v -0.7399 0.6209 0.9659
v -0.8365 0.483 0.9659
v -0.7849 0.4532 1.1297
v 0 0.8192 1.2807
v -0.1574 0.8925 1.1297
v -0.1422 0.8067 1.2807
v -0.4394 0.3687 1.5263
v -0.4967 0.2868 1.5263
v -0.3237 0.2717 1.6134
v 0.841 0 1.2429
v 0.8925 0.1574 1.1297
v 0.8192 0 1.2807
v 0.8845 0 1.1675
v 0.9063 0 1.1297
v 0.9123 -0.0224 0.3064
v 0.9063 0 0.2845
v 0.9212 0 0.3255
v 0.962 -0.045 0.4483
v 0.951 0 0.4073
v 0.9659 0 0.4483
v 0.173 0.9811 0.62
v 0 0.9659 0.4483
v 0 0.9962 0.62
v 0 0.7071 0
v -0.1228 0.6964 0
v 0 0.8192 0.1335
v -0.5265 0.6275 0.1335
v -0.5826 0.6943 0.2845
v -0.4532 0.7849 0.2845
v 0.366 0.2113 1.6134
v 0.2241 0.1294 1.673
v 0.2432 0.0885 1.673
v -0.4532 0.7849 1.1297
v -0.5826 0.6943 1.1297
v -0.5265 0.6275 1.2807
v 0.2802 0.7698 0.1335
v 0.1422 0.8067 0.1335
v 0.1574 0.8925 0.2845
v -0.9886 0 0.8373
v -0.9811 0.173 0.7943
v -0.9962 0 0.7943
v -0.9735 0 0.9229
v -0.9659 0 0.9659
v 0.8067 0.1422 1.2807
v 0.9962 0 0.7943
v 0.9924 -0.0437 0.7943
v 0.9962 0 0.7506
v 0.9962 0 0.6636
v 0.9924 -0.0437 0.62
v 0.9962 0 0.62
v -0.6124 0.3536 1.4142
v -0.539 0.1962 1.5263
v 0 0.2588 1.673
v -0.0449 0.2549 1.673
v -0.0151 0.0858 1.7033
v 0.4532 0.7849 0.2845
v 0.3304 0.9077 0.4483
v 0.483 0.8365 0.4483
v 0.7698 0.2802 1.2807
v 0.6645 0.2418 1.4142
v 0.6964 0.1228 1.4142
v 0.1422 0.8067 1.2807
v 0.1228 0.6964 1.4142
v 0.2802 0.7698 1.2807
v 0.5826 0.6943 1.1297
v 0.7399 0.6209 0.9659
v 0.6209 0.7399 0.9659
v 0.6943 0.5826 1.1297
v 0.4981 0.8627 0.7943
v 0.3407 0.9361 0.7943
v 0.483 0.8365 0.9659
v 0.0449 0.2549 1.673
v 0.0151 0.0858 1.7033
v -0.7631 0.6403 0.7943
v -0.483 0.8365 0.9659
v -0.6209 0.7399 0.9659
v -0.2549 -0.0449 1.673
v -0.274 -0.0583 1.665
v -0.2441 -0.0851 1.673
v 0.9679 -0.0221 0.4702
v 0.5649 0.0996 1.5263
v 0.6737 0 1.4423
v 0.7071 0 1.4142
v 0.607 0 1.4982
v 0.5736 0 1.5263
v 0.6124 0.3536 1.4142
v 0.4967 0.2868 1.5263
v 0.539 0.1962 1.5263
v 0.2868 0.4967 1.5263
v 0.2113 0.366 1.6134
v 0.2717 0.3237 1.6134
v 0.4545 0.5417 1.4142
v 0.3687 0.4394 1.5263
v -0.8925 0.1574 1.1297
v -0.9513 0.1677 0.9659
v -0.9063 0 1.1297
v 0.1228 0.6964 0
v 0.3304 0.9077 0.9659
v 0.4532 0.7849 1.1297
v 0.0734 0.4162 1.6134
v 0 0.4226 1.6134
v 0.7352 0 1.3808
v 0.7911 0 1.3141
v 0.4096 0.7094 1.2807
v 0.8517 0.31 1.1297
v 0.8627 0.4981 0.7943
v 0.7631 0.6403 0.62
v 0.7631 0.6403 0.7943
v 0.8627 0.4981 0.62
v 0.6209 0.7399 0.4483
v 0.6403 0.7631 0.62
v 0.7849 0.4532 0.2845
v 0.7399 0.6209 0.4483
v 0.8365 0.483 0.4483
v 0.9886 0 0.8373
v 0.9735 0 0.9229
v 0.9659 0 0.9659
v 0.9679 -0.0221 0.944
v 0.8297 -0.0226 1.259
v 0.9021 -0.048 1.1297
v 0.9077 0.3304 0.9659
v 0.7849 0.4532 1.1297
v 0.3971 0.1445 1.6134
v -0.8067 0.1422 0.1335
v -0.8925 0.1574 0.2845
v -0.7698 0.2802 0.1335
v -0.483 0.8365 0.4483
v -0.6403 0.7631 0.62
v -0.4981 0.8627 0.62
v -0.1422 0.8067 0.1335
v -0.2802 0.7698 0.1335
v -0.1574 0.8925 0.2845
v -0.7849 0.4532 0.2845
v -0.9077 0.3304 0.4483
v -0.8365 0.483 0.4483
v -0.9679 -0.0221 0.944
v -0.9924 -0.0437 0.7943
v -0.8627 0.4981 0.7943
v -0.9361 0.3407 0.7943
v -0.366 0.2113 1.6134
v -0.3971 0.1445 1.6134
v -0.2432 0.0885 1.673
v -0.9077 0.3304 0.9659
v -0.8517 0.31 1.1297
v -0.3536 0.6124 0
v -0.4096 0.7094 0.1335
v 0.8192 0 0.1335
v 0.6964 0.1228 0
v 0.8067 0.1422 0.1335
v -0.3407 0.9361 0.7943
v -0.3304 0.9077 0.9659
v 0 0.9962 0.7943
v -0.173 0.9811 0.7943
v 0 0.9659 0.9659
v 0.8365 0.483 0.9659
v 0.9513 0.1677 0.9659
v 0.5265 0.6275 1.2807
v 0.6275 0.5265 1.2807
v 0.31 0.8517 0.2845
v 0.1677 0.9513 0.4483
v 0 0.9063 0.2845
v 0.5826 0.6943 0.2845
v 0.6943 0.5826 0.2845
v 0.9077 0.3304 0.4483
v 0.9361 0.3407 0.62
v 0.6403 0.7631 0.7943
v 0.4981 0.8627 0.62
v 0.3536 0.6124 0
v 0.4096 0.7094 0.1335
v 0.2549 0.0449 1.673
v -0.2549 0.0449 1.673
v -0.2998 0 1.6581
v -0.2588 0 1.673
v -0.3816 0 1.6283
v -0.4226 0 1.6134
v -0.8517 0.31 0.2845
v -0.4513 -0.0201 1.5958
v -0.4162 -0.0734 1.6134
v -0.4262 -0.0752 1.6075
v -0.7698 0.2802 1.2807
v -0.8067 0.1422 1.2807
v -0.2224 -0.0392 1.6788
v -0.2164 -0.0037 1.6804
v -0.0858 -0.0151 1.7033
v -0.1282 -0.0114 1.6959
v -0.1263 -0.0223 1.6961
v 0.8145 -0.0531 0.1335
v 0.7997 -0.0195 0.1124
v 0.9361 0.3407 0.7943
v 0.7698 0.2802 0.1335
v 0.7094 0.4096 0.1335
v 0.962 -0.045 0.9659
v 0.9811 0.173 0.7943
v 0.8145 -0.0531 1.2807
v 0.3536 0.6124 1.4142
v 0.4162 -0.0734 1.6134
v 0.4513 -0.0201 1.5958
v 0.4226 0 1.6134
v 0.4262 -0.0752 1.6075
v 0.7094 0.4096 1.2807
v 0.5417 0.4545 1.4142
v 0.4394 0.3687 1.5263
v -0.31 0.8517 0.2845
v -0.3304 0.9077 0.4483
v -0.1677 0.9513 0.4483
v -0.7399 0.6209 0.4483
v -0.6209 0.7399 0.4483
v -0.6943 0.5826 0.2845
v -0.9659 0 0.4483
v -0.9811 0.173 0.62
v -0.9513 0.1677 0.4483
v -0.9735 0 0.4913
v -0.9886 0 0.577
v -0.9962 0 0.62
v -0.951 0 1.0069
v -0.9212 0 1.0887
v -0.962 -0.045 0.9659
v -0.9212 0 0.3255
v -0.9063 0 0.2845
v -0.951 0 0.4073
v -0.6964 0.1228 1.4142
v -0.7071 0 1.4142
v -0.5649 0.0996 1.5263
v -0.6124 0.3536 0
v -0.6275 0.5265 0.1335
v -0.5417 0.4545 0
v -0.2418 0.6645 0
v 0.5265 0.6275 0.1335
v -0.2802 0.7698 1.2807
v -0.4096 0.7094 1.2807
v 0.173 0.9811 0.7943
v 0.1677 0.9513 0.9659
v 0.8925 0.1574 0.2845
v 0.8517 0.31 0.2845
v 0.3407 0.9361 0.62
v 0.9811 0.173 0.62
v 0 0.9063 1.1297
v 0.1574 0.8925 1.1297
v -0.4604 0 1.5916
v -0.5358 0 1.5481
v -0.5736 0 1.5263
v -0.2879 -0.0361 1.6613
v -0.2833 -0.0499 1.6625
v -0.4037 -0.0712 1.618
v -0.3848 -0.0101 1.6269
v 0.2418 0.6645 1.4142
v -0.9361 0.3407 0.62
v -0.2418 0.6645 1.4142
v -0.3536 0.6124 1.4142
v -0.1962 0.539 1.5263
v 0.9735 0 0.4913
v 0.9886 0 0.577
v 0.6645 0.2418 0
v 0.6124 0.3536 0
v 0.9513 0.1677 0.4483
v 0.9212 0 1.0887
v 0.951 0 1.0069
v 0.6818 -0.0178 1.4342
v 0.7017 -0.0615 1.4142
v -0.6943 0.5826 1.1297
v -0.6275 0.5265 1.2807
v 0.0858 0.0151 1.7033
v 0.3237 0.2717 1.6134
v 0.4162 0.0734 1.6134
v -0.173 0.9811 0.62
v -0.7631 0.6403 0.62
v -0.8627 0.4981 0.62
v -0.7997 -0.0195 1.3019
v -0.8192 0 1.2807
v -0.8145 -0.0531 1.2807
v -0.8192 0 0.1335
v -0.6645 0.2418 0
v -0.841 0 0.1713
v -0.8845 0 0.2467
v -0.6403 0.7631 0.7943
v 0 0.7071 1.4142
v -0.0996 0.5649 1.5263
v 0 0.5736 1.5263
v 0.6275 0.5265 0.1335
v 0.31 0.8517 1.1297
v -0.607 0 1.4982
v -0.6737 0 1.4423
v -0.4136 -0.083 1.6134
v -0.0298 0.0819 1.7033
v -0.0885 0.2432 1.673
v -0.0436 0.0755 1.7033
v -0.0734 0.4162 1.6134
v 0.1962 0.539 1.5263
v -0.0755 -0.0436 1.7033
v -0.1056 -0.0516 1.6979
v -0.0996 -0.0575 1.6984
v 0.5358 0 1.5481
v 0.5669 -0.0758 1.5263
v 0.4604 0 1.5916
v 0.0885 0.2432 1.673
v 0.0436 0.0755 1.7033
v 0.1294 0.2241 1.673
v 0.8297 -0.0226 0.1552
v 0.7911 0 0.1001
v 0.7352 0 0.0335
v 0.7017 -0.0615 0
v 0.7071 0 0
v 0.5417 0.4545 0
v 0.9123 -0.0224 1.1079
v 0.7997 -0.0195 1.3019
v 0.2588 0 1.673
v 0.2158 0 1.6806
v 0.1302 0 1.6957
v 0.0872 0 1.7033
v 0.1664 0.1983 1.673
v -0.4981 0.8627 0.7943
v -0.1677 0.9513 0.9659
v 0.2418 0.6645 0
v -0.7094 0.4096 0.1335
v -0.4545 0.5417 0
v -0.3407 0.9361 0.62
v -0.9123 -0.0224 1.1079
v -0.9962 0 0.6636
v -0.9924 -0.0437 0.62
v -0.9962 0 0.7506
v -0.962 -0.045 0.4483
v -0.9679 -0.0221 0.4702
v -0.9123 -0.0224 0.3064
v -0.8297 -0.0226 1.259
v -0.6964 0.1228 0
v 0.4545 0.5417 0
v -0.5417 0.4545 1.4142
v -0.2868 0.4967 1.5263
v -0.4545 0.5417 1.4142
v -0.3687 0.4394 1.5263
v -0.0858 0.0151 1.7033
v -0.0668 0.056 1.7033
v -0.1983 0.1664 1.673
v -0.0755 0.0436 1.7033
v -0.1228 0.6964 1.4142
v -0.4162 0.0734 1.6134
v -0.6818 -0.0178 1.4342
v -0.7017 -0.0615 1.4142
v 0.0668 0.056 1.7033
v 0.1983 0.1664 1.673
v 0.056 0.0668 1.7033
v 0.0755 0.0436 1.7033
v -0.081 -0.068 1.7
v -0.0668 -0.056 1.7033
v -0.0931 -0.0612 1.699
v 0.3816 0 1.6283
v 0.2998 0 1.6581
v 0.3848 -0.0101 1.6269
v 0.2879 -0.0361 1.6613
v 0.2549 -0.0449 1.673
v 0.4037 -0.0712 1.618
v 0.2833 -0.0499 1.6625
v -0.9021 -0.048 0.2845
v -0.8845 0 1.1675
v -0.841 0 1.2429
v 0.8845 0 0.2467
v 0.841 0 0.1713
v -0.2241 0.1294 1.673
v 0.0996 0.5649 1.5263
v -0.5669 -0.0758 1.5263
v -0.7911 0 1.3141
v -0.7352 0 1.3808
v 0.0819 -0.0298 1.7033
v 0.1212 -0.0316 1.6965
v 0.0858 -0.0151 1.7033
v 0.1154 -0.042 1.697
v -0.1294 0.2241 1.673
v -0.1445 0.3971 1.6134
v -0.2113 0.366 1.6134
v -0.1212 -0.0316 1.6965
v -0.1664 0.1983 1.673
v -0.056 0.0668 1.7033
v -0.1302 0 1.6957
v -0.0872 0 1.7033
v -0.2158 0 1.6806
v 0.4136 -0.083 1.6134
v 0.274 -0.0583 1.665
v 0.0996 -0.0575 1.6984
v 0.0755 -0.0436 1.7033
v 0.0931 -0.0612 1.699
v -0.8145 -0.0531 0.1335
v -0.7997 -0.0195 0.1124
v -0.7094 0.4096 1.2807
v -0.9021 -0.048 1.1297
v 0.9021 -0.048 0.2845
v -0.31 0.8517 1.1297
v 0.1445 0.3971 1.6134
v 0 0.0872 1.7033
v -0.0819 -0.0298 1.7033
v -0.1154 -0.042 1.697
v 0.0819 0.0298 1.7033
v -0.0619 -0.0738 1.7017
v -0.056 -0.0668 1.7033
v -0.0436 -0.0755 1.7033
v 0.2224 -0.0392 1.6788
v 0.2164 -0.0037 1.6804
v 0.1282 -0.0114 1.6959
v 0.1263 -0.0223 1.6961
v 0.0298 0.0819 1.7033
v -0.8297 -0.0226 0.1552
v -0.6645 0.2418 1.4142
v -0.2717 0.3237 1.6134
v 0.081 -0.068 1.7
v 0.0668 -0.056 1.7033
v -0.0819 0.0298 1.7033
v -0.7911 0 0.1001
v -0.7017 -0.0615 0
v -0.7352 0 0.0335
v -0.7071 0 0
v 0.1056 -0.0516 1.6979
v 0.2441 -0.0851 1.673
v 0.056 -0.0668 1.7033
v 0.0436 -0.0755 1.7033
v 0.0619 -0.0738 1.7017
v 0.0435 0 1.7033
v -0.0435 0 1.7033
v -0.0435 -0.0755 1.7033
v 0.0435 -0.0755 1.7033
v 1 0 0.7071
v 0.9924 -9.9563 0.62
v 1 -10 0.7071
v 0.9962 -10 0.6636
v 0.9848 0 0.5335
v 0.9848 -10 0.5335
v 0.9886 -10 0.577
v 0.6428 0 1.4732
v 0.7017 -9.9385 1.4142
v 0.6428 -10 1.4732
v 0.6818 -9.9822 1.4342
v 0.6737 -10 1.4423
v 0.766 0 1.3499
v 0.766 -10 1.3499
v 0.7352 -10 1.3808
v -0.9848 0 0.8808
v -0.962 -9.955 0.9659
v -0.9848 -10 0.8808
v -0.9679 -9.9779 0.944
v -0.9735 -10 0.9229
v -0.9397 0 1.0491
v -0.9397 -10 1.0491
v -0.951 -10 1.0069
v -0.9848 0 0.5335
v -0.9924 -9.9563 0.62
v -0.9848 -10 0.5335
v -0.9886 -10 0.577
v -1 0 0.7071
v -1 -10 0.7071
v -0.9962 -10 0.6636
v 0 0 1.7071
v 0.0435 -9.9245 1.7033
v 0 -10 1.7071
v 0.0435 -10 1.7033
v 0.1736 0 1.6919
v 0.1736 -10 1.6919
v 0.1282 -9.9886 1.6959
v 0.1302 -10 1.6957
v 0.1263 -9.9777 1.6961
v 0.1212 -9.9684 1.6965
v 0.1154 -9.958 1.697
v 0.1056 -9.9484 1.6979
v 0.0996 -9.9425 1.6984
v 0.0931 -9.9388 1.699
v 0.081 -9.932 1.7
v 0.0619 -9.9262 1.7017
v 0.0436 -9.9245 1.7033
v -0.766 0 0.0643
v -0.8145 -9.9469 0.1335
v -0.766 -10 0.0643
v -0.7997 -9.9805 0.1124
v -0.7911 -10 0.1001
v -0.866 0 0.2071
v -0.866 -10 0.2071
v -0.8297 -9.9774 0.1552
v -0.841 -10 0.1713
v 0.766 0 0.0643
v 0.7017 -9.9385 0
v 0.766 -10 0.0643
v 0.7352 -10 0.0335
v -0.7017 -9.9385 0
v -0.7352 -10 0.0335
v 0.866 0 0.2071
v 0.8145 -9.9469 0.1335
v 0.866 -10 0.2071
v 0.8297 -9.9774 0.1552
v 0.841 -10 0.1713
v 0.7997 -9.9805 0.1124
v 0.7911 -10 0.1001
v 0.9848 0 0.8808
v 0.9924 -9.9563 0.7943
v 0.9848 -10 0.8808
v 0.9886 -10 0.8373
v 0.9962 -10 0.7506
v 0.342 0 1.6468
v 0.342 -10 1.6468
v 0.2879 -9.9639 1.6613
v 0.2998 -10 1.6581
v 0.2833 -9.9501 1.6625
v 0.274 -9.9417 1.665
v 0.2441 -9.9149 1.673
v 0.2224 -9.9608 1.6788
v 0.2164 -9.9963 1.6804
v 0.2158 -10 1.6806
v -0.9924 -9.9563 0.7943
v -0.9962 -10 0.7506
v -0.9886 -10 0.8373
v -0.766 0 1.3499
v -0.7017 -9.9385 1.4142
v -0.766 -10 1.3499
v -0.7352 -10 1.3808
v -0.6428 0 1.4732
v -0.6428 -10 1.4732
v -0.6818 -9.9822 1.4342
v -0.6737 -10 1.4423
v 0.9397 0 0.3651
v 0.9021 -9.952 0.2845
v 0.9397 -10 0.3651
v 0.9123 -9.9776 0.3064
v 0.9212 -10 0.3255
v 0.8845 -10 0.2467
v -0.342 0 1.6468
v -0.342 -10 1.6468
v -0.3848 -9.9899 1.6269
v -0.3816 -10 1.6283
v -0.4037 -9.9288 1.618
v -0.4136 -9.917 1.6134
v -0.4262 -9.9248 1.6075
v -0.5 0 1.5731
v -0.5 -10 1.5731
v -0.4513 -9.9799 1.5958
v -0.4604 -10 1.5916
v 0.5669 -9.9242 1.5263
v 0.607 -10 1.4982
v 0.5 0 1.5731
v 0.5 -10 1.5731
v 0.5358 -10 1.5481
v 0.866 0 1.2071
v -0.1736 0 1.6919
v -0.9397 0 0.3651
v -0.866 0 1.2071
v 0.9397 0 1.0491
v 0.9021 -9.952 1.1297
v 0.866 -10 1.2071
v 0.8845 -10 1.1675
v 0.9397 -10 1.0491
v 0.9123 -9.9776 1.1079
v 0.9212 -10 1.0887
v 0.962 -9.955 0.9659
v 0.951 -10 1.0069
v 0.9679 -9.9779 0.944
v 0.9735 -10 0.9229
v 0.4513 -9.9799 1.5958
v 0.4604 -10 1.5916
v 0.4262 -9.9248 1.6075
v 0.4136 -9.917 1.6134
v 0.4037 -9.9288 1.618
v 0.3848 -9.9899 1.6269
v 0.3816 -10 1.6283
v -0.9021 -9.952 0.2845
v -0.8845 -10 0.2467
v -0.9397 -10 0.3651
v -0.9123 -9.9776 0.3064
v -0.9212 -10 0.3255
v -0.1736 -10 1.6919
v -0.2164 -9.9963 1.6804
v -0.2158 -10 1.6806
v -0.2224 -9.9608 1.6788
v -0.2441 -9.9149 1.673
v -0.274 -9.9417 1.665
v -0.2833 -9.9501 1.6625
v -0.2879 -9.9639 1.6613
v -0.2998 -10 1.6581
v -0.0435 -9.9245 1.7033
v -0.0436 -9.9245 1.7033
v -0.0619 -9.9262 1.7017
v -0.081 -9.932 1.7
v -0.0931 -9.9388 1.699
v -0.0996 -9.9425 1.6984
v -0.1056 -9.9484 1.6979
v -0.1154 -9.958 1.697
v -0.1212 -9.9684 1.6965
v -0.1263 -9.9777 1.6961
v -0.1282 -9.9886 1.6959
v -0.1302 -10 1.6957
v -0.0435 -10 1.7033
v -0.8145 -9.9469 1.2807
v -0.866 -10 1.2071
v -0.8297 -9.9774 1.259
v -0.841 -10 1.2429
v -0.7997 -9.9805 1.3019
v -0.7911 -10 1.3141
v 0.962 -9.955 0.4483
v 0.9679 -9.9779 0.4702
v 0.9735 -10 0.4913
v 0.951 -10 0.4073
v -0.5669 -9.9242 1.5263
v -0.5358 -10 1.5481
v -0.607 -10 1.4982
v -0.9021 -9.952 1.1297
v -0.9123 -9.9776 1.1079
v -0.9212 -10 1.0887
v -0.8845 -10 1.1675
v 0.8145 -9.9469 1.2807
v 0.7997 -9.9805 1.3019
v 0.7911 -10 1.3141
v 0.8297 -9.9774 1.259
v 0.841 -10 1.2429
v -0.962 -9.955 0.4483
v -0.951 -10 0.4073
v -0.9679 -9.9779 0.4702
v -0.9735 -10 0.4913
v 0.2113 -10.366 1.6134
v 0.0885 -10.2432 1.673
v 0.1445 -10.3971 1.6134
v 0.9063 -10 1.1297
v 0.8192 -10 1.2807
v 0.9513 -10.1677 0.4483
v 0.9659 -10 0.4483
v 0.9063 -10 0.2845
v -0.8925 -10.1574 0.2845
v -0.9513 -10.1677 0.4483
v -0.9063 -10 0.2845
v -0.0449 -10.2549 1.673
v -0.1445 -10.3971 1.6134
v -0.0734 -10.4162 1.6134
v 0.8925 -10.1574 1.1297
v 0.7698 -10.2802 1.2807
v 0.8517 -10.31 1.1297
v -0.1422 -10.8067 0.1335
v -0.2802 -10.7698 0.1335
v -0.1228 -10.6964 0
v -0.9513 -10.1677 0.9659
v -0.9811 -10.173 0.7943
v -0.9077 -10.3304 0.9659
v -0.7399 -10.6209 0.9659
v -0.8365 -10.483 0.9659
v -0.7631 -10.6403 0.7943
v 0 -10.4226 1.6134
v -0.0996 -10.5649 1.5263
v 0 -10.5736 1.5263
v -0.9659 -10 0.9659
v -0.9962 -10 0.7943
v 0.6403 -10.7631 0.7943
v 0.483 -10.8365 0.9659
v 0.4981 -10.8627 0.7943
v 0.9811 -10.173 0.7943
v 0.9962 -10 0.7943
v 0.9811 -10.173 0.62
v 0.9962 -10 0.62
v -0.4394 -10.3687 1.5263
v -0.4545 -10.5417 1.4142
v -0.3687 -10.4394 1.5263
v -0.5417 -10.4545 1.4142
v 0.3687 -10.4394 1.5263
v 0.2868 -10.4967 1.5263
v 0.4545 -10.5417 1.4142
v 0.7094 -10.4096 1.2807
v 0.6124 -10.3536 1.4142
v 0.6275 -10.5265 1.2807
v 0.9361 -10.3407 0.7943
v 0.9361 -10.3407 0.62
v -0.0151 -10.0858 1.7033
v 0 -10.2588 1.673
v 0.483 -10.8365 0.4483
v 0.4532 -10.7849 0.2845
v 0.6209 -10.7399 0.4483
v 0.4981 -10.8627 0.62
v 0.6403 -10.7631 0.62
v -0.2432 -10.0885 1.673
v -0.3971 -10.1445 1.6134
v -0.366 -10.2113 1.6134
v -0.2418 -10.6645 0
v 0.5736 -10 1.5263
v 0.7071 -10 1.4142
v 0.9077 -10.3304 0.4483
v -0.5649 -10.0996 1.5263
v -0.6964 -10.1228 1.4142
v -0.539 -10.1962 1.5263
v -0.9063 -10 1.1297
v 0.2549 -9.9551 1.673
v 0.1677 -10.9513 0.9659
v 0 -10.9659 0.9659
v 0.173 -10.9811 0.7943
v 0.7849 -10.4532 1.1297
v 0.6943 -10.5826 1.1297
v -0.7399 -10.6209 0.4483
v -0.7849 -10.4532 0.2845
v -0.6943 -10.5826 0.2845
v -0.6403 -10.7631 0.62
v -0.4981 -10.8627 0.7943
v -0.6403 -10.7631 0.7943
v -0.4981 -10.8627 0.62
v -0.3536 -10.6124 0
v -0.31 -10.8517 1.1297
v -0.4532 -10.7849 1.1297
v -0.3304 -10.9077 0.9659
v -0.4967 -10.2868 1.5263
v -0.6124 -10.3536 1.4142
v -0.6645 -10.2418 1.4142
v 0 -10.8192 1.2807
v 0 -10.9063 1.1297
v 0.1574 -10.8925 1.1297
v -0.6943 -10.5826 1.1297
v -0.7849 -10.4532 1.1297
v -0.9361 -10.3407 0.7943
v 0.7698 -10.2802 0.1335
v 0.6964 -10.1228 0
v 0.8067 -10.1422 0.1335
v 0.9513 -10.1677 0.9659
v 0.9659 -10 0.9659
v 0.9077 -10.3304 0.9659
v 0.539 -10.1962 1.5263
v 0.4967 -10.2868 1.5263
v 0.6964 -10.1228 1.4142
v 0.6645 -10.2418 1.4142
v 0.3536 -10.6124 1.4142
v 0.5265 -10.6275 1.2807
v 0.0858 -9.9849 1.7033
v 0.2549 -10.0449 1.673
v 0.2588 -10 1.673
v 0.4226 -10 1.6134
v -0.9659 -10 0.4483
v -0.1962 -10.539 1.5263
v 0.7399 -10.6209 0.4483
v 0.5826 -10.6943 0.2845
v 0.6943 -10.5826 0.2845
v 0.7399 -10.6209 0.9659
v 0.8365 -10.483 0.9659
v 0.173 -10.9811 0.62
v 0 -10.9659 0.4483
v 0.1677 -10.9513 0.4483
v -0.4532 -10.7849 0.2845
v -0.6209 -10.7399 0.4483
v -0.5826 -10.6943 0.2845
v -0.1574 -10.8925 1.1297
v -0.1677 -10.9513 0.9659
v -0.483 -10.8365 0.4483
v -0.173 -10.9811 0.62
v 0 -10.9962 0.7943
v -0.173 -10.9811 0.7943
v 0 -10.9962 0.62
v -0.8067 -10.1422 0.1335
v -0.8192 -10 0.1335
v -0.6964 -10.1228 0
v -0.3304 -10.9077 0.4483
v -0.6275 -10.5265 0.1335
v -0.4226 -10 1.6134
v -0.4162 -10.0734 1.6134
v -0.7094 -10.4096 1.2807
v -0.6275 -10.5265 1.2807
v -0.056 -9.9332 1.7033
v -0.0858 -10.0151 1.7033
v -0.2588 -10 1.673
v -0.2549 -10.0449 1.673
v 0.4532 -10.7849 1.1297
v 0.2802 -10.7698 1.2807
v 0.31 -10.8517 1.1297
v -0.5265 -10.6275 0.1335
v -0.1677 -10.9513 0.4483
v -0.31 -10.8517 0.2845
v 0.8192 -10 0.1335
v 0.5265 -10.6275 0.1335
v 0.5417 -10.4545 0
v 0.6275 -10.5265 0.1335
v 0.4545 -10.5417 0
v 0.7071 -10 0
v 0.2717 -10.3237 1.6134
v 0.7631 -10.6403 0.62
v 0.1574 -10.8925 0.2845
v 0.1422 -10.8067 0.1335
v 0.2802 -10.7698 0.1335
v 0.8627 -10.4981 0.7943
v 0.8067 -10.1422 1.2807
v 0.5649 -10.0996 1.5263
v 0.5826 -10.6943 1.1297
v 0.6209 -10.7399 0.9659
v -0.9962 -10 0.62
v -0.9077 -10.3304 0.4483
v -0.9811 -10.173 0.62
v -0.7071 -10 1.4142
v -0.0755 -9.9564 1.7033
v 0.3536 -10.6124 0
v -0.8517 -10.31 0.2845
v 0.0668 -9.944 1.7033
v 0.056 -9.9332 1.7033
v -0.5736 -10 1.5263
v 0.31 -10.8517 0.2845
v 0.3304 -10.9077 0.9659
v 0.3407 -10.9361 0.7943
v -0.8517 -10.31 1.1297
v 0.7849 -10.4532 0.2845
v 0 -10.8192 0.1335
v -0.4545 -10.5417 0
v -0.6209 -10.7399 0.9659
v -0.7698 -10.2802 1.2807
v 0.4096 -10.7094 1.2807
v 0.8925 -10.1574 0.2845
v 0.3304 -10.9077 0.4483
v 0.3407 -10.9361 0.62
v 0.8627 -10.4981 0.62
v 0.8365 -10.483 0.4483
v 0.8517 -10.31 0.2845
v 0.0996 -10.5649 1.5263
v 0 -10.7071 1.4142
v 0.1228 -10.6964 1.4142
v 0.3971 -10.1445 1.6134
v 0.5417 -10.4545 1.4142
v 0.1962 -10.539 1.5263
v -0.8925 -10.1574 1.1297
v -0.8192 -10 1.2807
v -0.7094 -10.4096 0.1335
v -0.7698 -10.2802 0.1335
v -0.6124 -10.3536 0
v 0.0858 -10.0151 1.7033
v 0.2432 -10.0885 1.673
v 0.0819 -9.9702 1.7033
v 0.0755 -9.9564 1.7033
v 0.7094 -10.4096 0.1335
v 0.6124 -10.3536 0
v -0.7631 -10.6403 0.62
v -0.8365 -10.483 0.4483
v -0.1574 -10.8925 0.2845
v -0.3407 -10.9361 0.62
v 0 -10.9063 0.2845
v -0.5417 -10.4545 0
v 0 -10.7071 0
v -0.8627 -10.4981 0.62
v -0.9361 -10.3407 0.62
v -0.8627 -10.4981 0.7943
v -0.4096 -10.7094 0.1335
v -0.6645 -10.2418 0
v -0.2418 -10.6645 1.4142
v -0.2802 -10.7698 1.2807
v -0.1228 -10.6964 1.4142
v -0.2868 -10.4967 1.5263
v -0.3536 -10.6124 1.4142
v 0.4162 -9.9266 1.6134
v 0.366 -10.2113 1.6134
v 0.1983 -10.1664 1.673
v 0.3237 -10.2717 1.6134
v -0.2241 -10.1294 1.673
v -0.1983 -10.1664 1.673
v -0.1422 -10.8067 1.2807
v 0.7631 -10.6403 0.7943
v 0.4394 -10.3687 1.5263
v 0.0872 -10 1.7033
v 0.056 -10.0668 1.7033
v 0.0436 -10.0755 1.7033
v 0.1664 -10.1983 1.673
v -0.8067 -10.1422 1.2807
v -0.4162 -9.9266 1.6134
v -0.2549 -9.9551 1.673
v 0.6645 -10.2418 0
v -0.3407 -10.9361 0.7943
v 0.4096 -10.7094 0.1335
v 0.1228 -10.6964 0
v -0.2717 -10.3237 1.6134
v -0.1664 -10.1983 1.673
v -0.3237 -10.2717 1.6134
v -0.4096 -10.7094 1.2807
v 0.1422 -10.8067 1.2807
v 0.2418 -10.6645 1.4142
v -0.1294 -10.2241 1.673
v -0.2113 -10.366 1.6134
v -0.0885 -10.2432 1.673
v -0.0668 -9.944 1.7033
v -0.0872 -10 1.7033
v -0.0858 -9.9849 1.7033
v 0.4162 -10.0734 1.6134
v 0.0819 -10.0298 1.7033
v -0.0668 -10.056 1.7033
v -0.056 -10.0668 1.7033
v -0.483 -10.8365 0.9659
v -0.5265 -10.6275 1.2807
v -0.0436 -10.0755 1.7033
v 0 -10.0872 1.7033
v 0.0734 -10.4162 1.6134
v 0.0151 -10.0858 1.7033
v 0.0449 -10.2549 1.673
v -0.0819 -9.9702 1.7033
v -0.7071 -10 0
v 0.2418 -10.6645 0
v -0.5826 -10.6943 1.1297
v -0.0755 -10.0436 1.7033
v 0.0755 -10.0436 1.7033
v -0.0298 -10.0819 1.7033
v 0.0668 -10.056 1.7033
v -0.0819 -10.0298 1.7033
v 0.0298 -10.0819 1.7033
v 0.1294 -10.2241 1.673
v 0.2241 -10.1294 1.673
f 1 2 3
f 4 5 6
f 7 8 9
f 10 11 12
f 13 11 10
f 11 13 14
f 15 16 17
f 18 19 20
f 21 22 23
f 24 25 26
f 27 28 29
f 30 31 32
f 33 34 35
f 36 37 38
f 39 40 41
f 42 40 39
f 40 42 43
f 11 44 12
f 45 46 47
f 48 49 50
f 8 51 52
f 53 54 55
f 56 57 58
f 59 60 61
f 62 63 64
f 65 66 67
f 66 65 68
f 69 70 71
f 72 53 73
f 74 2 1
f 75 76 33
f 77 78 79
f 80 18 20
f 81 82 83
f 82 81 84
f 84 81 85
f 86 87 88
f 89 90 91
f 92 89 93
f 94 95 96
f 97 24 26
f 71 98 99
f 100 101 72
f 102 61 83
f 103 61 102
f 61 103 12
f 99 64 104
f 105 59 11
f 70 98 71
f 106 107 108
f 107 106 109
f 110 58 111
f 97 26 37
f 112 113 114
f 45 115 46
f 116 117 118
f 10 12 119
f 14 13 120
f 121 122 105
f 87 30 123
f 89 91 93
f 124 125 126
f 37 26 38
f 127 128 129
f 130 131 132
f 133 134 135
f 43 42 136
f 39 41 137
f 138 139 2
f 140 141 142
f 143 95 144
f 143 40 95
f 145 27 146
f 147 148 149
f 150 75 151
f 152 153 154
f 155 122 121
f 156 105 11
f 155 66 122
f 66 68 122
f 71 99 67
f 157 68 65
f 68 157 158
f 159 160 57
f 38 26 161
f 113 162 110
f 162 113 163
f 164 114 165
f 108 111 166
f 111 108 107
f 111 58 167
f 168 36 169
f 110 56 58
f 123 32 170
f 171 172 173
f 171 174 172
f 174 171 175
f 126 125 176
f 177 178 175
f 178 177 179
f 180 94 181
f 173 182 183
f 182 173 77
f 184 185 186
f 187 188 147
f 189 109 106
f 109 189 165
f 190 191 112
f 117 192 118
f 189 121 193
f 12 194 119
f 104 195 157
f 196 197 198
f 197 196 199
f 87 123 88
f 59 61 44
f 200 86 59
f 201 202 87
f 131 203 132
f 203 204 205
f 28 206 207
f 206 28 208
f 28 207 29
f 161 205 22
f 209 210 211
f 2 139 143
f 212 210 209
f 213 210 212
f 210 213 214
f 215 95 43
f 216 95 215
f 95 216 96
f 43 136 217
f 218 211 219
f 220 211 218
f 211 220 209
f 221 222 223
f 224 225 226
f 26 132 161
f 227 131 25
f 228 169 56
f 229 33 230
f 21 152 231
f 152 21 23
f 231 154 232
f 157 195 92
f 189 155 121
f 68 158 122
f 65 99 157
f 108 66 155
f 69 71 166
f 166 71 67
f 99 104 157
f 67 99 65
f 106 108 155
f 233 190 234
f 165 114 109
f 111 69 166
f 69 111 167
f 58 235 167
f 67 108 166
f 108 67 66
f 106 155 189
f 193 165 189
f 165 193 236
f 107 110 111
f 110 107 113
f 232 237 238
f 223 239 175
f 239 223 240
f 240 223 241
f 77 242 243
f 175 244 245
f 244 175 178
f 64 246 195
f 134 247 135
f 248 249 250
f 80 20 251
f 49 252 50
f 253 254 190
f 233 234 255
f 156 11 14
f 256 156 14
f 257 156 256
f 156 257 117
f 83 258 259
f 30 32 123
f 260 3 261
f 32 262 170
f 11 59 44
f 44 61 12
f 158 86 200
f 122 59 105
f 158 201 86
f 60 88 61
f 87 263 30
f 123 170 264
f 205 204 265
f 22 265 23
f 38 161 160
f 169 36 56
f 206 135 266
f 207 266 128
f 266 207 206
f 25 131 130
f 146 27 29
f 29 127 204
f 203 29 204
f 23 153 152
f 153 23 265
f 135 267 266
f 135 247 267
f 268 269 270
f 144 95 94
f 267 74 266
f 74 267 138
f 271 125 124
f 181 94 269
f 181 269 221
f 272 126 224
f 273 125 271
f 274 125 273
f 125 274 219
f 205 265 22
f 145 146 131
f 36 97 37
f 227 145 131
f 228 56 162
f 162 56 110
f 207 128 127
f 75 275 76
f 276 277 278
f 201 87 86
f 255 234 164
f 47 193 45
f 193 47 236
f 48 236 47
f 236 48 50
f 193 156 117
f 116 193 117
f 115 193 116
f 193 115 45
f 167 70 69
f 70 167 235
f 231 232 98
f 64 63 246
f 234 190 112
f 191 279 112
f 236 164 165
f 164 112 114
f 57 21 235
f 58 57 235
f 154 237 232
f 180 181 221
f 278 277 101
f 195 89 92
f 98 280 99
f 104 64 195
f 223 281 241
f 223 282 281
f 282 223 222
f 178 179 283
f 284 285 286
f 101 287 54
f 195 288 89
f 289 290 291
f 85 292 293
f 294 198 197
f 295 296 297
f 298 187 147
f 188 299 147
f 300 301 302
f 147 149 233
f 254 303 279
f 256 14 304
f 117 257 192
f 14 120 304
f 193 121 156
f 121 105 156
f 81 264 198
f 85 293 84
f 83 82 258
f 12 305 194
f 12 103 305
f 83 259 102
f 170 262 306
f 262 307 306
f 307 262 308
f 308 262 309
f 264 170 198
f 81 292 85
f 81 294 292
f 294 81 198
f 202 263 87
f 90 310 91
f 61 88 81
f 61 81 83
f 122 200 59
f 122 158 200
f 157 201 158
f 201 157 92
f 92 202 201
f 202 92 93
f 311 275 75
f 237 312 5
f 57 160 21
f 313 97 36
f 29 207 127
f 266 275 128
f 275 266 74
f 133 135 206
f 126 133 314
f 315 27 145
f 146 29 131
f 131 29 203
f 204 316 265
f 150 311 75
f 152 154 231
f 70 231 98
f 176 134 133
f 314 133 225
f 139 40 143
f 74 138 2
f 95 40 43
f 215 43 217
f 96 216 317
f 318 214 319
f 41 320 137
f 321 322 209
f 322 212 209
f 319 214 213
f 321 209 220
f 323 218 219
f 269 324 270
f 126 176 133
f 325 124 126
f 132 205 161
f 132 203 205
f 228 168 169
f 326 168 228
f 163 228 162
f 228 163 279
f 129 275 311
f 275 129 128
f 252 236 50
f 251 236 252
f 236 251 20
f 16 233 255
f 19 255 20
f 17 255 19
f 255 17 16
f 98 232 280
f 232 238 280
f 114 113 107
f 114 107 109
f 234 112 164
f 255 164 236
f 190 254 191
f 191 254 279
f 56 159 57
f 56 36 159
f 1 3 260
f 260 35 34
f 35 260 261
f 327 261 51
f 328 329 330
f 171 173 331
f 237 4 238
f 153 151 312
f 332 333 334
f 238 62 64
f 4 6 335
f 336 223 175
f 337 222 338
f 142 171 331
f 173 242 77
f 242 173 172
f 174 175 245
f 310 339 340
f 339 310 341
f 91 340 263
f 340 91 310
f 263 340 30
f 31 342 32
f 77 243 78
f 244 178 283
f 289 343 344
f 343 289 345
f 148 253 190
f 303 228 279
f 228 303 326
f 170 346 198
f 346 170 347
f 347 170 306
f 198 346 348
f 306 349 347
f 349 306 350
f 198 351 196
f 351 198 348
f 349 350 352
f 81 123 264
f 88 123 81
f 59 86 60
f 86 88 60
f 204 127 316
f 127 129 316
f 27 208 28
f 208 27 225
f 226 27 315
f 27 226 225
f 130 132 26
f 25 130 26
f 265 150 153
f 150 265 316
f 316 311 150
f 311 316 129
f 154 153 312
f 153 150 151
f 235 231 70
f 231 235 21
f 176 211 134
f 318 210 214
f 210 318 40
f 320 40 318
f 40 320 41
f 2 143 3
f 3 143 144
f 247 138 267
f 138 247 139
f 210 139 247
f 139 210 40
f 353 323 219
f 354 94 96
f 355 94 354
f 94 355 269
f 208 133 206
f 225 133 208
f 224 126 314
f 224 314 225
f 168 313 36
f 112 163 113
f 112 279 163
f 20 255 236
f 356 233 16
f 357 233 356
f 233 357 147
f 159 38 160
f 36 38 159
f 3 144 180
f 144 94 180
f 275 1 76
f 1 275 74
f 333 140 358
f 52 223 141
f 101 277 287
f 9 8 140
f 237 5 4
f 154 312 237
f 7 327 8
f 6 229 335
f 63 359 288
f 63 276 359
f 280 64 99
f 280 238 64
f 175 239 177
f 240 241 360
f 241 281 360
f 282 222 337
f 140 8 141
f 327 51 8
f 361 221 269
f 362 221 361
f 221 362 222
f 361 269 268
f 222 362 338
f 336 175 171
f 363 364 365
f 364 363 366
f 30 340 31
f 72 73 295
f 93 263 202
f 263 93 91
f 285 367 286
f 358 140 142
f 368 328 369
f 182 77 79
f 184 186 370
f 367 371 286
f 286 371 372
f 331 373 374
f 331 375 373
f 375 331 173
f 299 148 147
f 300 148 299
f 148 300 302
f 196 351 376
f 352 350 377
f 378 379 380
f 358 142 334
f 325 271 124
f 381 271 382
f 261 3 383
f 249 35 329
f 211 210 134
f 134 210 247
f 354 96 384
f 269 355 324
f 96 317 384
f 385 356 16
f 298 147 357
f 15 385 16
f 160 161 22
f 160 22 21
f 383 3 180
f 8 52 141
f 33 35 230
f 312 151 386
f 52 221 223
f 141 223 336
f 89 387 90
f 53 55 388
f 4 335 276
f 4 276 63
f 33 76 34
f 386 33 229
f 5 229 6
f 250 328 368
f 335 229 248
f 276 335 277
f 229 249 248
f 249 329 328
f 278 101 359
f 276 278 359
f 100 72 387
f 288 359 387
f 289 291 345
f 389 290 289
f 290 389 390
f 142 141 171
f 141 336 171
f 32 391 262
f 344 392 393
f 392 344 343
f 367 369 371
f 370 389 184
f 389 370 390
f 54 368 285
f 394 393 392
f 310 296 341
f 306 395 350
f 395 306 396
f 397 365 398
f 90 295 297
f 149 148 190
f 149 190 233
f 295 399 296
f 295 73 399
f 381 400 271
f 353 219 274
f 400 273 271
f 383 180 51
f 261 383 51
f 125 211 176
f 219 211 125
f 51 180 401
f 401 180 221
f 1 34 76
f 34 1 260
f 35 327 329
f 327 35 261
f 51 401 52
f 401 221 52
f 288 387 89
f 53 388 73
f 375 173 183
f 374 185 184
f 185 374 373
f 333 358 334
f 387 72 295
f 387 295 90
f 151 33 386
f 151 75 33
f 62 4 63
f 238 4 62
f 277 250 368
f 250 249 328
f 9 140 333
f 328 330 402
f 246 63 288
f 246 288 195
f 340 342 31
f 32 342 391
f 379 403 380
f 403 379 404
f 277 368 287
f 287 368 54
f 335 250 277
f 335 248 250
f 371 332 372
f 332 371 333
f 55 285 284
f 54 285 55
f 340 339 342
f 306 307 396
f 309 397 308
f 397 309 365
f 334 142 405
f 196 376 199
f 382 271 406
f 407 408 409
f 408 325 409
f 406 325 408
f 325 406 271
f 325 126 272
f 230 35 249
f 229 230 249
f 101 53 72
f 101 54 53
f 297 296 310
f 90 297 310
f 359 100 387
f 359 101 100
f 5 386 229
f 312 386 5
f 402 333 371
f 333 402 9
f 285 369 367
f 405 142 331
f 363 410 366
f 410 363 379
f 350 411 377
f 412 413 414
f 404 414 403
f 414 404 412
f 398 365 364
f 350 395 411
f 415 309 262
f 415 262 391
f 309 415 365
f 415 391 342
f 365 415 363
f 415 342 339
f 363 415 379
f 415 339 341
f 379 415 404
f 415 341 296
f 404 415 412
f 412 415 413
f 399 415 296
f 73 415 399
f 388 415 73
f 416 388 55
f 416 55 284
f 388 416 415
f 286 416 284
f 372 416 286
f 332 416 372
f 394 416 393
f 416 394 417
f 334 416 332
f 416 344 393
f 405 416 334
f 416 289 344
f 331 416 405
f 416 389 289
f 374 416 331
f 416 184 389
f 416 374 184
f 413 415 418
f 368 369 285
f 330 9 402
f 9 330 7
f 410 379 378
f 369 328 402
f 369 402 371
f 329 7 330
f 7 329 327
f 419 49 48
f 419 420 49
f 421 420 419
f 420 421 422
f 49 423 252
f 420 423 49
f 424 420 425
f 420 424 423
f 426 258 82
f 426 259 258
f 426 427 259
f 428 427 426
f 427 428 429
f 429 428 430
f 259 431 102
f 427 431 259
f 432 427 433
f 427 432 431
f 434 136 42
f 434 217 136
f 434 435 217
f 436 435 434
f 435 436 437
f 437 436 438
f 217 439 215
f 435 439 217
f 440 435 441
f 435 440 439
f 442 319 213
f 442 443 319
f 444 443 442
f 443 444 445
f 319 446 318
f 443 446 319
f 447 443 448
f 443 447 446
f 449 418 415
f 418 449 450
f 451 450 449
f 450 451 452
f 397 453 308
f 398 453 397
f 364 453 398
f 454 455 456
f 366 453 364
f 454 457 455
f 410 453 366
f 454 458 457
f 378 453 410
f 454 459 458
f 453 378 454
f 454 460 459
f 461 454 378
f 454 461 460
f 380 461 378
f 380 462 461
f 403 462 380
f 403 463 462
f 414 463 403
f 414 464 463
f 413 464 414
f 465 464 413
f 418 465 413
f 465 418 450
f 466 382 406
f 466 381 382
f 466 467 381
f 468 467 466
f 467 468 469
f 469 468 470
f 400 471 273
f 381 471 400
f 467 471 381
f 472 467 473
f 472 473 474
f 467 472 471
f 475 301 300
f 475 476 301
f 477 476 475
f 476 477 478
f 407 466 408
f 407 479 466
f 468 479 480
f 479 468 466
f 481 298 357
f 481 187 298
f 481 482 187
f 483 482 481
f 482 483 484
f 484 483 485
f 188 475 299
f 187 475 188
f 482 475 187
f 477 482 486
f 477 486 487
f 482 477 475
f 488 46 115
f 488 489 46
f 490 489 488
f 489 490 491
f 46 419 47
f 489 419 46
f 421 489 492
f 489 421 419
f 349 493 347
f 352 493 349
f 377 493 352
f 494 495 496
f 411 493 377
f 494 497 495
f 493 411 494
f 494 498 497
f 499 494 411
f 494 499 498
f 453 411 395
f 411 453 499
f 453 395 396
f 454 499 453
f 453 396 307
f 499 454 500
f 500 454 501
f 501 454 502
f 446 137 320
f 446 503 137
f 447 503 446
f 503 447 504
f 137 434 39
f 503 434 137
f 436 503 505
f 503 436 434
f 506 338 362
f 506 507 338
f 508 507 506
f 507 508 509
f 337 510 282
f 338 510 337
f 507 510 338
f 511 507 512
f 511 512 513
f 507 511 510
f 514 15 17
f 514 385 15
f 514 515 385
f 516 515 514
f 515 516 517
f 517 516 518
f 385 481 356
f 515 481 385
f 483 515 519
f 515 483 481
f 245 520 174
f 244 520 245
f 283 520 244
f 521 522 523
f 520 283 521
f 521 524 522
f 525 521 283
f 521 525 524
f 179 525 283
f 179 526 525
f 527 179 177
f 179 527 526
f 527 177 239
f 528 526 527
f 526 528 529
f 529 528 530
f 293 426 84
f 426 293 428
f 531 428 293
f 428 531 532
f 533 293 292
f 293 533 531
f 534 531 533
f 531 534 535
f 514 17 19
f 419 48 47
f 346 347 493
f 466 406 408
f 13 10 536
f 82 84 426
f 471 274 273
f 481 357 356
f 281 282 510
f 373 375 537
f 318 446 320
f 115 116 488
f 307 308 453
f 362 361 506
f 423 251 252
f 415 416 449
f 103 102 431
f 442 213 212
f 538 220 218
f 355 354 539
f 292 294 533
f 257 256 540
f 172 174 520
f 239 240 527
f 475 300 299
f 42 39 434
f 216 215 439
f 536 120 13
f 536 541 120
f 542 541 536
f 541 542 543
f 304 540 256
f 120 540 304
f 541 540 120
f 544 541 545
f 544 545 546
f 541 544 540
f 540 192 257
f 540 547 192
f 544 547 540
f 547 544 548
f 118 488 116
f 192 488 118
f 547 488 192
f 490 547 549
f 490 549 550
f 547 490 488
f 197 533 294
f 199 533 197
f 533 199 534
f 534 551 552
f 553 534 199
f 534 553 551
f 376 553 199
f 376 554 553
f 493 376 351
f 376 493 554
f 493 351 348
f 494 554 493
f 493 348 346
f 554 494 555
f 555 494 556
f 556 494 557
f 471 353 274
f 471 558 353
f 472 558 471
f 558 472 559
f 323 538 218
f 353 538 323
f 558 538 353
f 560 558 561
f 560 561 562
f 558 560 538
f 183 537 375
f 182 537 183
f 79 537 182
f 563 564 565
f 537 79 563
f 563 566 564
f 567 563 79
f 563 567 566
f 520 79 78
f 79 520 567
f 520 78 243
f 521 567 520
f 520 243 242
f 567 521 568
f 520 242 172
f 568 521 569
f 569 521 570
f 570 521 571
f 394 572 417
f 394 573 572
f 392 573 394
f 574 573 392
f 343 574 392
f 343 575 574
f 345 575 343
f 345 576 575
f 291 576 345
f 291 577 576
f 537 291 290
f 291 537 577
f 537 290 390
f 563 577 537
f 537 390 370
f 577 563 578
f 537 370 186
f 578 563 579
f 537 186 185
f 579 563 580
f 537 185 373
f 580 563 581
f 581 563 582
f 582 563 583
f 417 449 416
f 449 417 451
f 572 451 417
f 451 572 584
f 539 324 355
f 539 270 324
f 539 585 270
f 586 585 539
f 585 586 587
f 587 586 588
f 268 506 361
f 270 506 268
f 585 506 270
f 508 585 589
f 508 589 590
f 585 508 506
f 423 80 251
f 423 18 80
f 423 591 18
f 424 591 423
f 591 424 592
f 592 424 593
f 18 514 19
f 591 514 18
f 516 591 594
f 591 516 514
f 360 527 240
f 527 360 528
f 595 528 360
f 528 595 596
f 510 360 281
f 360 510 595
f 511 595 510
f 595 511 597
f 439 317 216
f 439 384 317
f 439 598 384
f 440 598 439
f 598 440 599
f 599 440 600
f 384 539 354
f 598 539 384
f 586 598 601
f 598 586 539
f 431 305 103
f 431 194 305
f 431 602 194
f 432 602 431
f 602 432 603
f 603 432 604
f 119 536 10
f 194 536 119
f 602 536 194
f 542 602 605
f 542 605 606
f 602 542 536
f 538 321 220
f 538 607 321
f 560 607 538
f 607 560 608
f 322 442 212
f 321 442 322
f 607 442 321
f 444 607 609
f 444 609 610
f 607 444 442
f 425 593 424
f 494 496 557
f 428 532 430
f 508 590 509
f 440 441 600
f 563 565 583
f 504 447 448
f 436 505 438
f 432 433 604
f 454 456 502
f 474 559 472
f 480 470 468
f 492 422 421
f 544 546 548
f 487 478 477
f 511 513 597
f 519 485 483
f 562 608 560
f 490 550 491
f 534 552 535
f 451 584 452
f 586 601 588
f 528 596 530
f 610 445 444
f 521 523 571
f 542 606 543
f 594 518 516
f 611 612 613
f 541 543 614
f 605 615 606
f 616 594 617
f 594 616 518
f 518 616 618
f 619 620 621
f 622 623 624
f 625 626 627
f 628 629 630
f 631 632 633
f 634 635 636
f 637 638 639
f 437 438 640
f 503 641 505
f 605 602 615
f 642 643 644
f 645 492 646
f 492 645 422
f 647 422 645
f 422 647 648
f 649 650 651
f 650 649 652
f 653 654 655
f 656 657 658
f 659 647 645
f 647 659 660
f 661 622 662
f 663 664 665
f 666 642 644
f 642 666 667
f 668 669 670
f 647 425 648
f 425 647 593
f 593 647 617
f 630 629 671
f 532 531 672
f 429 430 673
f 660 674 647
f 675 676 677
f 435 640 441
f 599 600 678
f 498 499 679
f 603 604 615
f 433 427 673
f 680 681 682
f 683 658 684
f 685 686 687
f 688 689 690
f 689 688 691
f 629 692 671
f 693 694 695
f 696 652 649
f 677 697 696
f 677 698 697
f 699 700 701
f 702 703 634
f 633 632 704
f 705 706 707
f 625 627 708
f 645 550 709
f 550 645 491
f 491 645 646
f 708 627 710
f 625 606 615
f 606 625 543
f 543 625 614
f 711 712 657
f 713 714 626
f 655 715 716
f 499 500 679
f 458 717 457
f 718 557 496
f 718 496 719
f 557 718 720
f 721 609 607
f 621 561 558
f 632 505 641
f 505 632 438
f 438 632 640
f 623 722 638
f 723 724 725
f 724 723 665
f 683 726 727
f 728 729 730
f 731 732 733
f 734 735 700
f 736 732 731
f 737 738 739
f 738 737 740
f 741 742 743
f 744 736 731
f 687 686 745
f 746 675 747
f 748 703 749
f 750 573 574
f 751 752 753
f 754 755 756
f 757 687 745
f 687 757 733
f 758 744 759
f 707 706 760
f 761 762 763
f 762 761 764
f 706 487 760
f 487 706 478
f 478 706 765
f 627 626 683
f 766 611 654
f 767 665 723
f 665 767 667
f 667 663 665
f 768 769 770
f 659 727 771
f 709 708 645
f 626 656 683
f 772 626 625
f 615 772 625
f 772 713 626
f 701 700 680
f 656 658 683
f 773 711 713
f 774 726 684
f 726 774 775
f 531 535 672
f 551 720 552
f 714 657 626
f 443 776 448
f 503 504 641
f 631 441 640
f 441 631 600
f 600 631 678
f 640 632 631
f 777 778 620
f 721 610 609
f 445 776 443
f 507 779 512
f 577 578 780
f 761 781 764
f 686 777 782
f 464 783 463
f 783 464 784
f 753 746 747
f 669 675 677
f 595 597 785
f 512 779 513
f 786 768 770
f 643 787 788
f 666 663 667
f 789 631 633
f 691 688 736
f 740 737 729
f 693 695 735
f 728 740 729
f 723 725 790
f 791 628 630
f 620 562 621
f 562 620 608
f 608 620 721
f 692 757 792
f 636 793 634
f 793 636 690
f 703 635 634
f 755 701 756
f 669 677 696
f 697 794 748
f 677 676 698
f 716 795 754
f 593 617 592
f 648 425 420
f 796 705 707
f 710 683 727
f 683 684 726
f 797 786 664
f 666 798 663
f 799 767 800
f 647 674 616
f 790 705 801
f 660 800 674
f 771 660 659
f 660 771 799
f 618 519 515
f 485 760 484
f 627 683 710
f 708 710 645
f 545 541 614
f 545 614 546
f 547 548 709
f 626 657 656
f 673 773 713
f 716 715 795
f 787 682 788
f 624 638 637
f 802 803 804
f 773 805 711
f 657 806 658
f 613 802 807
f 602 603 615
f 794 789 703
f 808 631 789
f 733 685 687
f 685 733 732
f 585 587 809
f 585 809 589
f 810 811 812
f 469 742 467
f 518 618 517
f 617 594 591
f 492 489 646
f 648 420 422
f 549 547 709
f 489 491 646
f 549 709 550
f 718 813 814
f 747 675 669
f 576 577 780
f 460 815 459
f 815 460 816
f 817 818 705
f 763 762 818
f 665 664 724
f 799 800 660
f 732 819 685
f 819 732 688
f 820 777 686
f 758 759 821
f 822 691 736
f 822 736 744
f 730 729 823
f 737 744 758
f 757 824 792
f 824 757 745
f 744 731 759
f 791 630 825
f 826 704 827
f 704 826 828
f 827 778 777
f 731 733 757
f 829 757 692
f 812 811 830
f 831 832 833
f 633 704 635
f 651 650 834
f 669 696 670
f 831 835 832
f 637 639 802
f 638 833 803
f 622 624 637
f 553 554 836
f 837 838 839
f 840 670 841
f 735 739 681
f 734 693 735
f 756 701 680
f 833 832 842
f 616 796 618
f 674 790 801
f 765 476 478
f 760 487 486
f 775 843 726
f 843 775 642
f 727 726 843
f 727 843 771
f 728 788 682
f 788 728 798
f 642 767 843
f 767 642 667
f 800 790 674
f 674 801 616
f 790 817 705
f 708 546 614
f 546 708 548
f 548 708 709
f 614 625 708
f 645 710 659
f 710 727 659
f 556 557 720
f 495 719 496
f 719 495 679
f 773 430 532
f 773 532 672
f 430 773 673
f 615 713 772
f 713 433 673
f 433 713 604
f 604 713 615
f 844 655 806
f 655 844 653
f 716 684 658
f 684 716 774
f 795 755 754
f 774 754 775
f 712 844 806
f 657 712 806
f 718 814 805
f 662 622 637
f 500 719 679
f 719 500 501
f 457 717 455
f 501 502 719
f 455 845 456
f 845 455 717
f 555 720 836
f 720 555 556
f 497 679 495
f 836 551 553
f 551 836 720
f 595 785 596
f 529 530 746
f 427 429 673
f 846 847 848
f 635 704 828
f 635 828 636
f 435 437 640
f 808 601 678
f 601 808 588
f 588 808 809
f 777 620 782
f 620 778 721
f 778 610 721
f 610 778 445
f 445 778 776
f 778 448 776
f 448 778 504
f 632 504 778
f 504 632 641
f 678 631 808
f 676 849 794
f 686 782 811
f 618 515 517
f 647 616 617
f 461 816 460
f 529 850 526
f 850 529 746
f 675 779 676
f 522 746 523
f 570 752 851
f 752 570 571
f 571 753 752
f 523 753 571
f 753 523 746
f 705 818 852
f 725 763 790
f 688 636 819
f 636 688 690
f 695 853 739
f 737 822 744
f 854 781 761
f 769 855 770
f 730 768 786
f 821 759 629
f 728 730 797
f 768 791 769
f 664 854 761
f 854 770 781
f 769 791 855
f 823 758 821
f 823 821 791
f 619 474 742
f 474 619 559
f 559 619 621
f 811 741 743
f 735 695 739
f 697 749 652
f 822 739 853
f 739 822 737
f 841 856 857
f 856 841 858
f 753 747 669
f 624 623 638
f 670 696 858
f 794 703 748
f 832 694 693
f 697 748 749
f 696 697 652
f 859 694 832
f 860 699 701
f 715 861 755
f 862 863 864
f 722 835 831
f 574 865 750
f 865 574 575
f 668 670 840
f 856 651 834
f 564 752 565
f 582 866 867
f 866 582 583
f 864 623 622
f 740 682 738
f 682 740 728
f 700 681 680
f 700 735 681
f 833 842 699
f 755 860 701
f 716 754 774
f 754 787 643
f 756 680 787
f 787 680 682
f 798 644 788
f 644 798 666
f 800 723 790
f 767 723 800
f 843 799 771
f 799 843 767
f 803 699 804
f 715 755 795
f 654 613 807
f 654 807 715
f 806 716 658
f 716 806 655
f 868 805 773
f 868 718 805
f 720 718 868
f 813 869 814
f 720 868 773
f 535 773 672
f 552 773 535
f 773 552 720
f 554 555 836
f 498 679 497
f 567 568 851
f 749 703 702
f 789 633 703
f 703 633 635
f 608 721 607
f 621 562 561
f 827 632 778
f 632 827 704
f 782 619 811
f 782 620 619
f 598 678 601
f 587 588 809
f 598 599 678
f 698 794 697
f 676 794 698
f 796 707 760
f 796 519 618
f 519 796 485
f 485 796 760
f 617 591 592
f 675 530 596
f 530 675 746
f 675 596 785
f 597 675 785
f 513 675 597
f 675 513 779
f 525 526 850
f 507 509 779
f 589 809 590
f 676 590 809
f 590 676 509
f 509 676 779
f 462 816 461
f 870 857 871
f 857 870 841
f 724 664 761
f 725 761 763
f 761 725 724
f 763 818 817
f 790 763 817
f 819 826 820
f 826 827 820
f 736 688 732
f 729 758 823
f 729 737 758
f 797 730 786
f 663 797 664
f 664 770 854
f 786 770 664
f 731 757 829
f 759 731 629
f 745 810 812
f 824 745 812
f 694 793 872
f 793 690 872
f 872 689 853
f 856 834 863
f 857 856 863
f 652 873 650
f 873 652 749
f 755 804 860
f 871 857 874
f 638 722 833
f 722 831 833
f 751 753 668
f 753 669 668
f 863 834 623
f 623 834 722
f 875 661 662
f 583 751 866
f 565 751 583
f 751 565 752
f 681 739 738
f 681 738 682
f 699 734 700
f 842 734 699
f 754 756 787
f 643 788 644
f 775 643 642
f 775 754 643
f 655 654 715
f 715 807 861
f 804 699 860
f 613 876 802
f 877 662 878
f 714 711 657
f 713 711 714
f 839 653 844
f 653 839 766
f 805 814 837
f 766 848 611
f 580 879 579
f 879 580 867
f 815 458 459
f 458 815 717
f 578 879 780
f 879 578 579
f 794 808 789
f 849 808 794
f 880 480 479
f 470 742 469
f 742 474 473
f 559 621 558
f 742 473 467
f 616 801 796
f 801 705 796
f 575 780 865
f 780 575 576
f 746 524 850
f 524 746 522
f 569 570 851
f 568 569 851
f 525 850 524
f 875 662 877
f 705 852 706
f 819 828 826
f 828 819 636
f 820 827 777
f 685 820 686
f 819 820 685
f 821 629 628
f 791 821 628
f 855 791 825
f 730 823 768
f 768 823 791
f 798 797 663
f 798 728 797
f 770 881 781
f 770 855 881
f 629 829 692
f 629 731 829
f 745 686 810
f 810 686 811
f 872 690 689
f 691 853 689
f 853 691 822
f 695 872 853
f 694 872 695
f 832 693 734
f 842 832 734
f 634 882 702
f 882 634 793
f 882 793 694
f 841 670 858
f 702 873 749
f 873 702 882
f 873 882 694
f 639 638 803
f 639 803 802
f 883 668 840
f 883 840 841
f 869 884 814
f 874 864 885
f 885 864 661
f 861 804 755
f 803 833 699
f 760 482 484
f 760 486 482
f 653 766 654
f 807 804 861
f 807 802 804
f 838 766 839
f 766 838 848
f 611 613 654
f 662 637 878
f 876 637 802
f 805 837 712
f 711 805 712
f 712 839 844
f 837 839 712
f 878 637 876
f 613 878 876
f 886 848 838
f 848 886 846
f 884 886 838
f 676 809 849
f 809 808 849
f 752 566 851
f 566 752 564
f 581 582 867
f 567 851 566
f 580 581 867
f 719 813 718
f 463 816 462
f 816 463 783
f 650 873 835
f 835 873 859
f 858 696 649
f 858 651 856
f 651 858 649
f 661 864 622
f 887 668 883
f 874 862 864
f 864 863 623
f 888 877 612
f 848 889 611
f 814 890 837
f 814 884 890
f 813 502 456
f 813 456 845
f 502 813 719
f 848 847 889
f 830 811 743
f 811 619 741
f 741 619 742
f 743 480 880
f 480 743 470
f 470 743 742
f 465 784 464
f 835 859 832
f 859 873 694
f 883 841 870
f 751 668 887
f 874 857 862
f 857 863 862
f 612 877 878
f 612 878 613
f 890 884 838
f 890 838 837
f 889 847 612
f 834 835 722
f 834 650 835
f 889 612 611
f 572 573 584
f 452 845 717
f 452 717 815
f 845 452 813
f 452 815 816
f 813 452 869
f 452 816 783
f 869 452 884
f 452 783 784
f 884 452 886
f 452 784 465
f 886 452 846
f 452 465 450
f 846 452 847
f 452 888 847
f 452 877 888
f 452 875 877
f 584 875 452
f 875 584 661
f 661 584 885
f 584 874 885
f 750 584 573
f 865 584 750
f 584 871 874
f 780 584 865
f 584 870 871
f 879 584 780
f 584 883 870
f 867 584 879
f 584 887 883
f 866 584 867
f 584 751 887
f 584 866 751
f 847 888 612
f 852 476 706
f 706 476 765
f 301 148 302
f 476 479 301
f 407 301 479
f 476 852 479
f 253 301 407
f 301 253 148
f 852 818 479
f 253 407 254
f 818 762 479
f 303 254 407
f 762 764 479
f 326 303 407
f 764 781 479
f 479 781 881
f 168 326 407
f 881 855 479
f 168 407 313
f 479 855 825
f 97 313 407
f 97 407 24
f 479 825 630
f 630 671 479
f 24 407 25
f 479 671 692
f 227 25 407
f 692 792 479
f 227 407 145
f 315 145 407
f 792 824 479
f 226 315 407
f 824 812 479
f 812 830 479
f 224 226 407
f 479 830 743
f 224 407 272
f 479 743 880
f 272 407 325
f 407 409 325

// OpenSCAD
// radiused_rod.scad
// https://www.thingiverse.com/thing:6079195
// https://www.printables.com/model/506143

// diameter of shaft
d = 2; // 0.01
// length of shaft (excluding rounds)
length = 10; // 0.1

// number of shafts
nShaft = 1;
// change in diameter per each shaft
deltaDia = 0; //0.1

// maximum overhang angle
overhang_angle = 45;
// round ends or square ends
roundEnds = true;

// head diameter factor  1= no head
headDiaFactor = 1; //0.1


// facet Number
$fn=36;
// epsilon for intersecting elements
eps = 0.0001;

// shaft with a ball on the end, flattened for printing
radiused_shaft_array(d,length,nShaft,deltaDia);


module radiused_shaft_array(d,length,nShaft,deltaDia){
    for(a = [0:nShaft-1]){
        translate([(a*((d+1+a*deltaDia/2))*(headDiaFactor)),0,0])
        radiused_shaft(d+a*deltaDia,length);
    }
}


//radiused_shaft(d,length);


module radiused_shaft(d,length){
    cutWidth = max(d,d*headDiaFactor);
    
    difference(){
        translate([0,0,cos(overhang_angle)* d/2]) bit1(d);
        translate([0-cutWidth/2,-length-d-eps,-d])cube([cutWidth,length+4*d,d]);
    }
}
module bit1(d=d){
    module end(){if(roundEnds == true)sphere(d=d);}
    module rod(length=length,d=d){
        rotate([90,0,0])
            linear_extrude(height = length)circle(d = d);
    }
    {
        end();
        rod();
        translate([0,-length,0])end();
        if(headDiaFactor != 1) {
            headDia = headDiaFactor * d;
            headLength = d/2;
            translate([0,headLength,0])rod(headLength,headDia);
        }
    }
}
